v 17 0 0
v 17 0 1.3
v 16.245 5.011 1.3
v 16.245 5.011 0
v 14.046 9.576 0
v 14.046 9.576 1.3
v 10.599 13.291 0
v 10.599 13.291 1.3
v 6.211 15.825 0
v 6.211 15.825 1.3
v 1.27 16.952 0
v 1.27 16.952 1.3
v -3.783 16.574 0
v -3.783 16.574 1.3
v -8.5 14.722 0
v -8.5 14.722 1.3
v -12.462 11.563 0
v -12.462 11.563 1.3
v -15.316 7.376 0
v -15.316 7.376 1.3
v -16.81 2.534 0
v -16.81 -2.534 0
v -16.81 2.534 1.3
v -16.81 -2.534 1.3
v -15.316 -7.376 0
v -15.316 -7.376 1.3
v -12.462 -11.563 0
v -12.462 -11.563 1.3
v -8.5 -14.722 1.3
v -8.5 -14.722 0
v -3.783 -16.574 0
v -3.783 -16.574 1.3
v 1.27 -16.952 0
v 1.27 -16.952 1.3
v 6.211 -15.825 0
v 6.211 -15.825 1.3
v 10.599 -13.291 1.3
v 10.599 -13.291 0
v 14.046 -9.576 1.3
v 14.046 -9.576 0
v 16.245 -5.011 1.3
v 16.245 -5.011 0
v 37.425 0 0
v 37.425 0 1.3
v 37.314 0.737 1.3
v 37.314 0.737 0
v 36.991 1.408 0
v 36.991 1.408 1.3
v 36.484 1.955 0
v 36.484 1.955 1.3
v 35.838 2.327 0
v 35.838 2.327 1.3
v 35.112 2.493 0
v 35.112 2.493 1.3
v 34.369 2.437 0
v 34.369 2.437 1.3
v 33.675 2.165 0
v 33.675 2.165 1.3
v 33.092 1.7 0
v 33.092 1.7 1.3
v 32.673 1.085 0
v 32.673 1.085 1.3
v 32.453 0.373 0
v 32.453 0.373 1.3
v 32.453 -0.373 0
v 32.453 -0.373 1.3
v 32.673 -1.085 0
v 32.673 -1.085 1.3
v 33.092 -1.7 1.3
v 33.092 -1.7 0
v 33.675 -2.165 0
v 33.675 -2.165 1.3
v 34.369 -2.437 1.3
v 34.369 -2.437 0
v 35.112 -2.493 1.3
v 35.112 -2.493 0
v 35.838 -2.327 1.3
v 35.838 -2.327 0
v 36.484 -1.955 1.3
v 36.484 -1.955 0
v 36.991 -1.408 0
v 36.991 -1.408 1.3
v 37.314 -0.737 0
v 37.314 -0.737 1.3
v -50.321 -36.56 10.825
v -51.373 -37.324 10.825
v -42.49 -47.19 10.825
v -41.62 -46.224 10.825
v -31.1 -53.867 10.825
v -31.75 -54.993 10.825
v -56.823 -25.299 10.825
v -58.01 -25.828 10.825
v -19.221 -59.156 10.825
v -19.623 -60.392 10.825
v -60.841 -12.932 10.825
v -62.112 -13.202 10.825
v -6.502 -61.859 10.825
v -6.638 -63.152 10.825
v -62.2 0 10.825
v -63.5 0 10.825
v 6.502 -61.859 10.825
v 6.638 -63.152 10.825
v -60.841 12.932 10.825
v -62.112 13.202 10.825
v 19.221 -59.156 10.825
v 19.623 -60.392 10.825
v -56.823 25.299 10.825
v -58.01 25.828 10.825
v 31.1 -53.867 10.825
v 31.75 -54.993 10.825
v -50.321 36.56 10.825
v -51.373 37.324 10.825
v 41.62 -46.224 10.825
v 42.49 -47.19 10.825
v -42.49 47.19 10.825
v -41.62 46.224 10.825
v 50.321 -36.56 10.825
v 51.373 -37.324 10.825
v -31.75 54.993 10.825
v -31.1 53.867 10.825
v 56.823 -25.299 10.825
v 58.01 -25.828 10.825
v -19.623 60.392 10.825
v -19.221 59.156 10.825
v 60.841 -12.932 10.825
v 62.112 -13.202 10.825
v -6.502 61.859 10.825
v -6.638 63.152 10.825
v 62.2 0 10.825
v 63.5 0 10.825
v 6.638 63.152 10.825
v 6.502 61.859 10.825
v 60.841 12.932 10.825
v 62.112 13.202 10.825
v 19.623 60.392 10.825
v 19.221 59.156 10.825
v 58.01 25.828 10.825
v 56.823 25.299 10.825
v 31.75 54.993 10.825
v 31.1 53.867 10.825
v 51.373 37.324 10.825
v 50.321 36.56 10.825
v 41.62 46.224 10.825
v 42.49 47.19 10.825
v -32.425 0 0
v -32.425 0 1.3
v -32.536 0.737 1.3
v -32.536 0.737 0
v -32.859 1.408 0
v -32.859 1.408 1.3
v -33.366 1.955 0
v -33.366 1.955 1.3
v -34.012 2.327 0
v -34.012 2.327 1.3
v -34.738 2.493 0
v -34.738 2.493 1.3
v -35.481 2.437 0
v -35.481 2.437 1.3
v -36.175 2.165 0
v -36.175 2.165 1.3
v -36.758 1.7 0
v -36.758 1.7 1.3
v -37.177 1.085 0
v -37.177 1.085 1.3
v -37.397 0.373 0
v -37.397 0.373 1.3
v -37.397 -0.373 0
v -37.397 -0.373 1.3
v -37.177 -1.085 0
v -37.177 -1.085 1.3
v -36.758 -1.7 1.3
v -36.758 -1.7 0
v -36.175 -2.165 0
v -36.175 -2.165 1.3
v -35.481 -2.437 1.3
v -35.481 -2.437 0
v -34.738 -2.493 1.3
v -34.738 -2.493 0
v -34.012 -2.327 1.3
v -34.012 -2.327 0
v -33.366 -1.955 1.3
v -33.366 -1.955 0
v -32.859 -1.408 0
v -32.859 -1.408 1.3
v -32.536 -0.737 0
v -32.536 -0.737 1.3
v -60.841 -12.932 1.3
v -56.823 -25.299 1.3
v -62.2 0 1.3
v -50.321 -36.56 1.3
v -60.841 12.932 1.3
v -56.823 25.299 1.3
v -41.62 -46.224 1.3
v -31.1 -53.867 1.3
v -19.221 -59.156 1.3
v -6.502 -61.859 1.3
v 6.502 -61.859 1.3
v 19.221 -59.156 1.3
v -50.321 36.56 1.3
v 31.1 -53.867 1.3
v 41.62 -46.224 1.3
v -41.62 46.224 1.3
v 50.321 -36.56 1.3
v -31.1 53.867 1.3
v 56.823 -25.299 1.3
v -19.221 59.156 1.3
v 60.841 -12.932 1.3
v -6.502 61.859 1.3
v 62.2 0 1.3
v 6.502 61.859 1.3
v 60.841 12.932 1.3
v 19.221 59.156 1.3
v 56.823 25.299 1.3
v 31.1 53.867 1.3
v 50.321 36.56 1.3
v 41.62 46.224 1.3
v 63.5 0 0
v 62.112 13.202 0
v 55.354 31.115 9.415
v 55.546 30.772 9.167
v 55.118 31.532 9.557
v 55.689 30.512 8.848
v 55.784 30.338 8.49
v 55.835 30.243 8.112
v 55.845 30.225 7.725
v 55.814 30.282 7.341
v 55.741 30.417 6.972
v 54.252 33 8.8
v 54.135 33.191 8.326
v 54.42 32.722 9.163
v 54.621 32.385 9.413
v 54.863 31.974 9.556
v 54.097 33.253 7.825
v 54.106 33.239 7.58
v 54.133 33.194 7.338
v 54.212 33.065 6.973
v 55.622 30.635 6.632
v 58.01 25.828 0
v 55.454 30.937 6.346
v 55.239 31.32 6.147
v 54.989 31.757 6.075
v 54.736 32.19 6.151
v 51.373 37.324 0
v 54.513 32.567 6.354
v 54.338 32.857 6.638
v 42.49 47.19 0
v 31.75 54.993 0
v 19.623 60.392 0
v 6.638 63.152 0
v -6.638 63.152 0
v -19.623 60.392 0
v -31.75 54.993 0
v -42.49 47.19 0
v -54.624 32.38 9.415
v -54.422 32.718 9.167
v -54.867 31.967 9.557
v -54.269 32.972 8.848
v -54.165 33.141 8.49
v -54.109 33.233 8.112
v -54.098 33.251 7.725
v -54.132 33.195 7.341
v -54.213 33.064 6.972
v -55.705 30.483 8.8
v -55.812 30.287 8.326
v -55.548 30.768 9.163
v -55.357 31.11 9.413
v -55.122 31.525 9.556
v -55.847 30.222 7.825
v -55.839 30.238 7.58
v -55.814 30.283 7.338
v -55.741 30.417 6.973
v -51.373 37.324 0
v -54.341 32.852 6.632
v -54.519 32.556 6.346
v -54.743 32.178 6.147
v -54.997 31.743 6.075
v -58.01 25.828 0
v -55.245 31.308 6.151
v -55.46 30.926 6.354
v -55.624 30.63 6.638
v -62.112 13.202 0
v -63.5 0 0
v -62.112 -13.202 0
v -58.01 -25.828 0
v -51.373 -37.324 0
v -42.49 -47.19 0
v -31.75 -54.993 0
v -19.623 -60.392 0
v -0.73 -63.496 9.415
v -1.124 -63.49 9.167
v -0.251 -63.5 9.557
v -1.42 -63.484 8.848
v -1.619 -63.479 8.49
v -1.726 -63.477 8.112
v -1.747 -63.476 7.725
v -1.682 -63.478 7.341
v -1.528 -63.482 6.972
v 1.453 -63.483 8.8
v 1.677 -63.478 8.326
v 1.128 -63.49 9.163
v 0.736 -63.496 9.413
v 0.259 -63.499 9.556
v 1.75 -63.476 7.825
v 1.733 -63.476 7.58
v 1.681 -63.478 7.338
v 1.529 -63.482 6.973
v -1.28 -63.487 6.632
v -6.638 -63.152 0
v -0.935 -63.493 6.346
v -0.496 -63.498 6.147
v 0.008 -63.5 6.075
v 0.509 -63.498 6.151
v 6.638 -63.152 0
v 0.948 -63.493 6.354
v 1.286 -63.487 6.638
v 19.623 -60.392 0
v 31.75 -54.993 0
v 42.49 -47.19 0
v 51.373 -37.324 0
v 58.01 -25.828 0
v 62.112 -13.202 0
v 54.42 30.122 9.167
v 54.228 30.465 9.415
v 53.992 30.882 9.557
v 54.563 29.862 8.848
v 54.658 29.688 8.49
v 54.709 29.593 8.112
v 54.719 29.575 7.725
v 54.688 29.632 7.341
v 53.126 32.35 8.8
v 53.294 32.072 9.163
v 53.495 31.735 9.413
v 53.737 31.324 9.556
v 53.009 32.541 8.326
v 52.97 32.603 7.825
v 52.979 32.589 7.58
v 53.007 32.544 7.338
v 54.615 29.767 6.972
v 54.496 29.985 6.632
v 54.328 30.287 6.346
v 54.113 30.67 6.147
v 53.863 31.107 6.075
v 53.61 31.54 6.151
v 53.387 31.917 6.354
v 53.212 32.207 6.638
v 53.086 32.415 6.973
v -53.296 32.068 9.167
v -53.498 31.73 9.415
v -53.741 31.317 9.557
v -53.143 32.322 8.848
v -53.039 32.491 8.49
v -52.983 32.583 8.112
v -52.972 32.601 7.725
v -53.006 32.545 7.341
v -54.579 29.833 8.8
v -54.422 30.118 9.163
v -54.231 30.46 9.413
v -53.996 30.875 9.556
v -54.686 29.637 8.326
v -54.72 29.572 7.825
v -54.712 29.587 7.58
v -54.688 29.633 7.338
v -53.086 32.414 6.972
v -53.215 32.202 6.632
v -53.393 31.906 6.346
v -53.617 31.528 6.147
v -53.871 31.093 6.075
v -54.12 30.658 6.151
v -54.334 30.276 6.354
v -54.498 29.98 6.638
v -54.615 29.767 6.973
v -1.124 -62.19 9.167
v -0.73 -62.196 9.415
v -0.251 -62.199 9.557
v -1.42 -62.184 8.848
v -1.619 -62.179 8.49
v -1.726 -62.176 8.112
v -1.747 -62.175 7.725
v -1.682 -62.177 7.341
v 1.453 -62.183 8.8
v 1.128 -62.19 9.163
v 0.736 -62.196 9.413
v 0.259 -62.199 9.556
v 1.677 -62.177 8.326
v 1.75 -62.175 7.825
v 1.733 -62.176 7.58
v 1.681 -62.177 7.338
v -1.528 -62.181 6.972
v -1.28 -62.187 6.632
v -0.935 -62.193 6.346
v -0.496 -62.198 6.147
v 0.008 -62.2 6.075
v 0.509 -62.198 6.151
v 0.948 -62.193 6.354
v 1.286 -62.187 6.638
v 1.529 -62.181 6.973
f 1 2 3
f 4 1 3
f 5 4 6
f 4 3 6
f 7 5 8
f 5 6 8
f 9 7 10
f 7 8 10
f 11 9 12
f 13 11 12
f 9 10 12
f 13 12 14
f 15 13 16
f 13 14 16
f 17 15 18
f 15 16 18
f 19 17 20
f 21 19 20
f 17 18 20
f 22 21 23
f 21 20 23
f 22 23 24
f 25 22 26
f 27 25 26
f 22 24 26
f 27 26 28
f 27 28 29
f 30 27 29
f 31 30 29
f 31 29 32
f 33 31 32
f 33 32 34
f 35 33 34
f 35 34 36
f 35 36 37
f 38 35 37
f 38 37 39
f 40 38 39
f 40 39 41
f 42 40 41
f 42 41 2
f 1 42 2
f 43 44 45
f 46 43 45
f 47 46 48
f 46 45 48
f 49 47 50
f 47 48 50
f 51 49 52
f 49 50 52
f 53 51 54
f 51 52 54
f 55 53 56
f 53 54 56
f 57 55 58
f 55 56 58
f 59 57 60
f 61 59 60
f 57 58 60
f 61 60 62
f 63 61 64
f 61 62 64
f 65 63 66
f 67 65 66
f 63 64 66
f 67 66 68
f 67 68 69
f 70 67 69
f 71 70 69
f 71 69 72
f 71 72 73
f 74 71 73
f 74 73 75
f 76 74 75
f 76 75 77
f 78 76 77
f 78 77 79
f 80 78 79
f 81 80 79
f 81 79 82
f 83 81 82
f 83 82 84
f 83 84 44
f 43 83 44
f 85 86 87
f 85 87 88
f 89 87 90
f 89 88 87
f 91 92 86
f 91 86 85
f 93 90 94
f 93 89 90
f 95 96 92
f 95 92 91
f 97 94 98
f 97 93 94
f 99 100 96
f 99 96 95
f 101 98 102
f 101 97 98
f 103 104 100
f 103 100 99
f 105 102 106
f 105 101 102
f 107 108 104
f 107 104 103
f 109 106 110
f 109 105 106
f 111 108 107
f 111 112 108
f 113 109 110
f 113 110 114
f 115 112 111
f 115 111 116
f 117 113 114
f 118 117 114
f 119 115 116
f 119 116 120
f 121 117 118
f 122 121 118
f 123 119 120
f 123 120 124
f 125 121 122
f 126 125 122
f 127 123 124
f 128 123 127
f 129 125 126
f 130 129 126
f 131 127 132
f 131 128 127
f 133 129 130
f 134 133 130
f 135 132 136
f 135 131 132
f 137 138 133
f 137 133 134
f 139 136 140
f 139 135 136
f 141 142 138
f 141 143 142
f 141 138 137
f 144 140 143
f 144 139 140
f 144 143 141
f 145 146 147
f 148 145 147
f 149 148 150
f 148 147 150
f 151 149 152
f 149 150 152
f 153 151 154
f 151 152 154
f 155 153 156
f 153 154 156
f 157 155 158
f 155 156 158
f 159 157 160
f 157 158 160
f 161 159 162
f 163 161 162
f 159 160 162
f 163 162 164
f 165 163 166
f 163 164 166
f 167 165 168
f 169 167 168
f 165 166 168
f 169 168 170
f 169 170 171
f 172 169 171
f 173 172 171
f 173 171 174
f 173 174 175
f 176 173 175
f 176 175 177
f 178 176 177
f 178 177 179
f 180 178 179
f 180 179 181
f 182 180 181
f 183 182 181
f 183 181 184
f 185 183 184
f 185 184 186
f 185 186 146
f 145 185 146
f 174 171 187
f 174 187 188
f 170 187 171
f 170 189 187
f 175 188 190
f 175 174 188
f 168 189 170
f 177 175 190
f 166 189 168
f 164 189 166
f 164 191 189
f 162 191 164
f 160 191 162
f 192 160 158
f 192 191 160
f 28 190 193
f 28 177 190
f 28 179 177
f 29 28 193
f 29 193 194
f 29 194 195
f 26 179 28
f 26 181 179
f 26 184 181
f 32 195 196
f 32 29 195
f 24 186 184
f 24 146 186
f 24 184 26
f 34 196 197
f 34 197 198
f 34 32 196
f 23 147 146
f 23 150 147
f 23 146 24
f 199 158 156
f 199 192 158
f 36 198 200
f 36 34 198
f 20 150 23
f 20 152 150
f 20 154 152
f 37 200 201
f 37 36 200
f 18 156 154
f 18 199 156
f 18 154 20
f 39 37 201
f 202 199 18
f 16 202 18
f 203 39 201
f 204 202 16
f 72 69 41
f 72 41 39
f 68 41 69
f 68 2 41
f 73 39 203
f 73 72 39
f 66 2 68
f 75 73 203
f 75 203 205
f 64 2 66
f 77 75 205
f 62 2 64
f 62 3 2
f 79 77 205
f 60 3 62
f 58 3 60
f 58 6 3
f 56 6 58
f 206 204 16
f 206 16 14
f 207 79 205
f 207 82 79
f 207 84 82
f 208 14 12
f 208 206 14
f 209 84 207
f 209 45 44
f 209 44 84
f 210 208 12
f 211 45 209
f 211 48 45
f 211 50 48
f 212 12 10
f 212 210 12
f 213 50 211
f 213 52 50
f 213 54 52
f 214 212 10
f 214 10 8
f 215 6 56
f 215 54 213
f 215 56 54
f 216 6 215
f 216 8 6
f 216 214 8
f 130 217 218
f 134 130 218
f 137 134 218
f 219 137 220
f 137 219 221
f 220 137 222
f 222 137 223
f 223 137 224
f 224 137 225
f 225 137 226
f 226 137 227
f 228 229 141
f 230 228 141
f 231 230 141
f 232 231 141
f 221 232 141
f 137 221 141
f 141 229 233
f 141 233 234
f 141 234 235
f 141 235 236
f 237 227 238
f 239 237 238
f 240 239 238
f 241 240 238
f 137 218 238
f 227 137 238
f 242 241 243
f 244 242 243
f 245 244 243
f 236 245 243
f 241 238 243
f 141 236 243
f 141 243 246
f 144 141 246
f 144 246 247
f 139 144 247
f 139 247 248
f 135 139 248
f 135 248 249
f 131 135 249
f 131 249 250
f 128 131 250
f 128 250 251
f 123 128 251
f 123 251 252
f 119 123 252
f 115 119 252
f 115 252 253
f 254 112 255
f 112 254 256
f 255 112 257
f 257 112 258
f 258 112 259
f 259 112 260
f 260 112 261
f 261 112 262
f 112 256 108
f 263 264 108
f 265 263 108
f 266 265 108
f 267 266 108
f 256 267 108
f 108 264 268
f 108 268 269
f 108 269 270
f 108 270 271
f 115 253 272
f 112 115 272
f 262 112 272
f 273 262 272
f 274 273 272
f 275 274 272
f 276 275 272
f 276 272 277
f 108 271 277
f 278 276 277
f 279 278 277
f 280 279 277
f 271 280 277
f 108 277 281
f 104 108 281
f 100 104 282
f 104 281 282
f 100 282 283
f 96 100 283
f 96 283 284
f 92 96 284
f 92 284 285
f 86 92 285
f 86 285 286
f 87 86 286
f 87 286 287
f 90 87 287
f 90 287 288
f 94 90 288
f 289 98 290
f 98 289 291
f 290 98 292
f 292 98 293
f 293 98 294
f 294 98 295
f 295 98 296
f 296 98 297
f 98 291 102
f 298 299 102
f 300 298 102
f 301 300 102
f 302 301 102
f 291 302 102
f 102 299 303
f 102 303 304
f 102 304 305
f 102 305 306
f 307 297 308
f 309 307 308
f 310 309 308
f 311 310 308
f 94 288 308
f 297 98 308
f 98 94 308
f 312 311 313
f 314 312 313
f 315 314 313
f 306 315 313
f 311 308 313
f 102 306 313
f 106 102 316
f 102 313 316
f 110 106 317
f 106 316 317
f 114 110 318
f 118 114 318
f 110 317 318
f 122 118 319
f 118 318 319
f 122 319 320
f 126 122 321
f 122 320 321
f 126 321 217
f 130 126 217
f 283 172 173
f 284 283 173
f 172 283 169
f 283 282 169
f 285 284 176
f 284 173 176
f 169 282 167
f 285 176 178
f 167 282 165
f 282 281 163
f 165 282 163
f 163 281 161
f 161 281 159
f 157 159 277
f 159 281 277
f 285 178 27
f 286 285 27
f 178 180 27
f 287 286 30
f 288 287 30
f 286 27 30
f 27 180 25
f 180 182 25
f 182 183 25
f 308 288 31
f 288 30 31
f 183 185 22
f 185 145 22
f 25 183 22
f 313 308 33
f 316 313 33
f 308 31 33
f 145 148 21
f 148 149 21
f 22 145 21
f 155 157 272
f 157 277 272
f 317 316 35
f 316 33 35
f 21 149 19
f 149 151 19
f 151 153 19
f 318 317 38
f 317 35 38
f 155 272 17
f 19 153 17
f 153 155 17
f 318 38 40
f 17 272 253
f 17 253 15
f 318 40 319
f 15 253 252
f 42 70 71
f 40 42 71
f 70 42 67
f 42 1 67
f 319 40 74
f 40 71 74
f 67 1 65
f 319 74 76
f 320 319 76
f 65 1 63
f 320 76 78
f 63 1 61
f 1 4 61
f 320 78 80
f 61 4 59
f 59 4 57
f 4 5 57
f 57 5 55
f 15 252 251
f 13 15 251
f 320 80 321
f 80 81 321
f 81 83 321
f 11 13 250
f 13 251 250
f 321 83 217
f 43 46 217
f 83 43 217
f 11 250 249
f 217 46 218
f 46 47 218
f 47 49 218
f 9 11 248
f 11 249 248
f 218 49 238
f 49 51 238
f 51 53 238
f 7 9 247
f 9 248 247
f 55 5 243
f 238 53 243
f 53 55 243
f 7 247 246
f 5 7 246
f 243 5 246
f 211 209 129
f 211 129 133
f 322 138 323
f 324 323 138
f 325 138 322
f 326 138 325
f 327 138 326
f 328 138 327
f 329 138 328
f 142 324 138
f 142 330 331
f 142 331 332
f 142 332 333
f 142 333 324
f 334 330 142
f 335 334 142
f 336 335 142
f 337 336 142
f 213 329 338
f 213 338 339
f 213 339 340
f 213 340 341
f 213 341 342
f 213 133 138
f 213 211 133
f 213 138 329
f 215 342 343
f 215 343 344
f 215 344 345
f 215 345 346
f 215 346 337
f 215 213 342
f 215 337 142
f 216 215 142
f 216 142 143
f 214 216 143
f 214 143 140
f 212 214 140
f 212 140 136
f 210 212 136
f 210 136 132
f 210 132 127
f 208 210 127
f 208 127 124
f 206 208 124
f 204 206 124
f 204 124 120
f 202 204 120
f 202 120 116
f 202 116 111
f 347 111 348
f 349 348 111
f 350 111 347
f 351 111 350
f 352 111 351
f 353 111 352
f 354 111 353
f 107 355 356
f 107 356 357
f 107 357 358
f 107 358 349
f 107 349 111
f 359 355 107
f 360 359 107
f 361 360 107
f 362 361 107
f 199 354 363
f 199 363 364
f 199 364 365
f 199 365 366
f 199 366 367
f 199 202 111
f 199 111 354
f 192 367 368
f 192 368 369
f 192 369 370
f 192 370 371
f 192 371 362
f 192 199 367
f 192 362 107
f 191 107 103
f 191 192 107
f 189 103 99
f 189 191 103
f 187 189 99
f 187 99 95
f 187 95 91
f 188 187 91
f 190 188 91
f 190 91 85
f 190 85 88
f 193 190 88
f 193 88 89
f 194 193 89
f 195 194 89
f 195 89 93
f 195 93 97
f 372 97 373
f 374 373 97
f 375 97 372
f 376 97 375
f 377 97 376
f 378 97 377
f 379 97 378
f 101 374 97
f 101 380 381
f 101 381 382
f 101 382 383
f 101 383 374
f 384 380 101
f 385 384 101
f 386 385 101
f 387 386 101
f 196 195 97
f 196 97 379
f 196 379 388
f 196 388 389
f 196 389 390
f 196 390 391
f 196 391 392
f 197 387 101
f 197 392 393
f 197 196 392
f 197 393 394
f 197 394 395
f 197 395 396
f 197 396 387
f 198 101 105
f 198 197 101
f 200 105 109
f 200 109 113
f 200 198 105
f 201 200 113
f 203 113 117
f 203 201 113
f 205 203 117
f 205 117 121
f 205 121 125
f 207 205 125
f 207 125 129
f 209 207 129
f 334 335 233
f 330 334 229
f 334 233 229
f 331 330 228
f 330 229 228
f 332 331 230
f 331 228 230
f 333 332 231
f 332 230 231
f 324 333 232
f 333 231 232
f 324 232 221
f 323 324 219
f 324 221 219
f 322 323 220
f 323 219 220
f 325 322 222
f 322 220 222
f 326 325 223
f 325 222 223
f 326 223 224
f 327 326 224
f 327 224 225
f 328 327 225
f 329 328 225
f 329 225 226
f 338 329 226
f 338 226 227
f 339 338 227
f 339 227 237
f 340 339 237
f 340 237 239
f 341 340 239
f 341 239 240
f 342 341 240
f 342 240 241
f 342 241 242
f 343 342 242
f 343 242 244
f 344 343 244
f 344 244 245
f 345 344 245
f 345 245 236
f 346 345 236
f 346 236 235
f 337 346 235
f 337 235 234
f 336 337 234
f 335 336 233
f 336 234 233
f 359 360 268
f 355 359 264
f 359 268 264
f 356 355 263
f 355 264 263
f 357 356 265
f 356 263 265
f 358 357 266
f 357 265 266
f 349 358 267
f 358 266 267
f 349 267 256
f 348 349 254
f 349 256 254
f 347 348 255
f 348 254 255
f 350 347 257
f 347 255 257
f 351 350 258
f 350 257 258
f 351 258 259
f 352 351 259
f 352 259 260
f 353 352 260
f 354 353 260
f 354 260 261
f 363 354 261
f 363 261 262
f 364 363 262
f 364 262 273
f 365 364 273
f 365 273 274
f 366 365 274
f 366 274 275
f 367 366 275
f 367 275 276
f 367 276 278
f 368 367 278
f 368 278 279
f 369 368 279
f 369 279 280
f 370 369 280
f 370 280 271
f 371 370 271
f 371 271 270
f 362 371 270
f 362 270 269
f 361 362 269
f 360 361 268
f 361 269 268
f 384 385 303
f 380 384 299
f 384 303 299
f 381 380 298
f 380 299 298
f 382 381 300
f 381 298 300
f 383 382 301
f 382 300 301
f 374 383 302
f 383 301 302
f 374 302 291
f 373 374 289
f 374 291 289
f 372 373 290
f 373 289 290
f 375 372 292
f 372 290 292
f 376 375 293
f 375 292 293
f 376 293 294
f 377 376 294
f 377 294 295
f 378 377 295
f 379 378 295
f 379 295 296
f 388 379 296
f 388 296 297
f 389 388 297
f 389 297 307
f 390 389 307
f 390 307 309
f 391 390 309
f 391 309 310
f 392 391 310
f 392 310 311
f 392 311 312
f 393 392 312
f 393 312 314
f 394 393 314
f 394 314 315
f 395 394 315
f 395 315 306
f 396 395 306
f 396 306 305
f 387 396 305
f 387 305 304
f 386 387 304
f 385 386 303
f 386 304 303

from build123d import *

# Parameters (mm, degrees)
F0_R      = 63.5
F1_DEPTH  = 1.3
F2_R      = 2.5
F3_DEPTH  = 25
F4_R      = 63.5
F4_R_2    = 62.2
F5_DEPTH  = 9.525
F7_R      = 1.75
F8_DEPTH  = 5
F9_COUNT  = 3
F11_R     = 17
F12_DEPTH = 25


with BuildPart() as f1:
    # F0 (on Top) → F1 (new body)
    with BuildSketch(Plane.XY):
        Circle(F0_R)
    extrude(amount=F1_DEPTH)

    # F2 (on face) → F3 (cut)
    with BuildSketch(Plane.XY.offset(1.3)):
        with Locations((-34.925, 0)):
            Circle(F2_R)
        with Locations((34.925, 0)):
            Circle(F2_R)
    extrude(amount=-F3_DEPTH, mode=Mode.SUBTRACT)

    # F4 (on face) → F5 (join)
    with BuildSketch(Plane.XY.offset(1.3)):
        Circle(F4_R)
        Circle(F4_R_2, mode=Mode.SUBTRACT)
    extrude(amount=F5_DEPTH)


with BuildPart() as f8:
    # F7 (on offset) → F8 (new body)
    with BuildSketch(Plane.XZ.offset(63.9)):
        with Locations((0, 7.825)):
            Circle(F7_R)
    extrude(amount=-F8_DEPTH)


with BuildPart() as f9_1:
    # F9: instance of F8
    add(f8.part.rotate(Axis((0, 0, 0), (0, 0, -1)), 1 * 360 / F9_COUNT))


with BuildPart() as f9_2:
    # F9: instance of F8
    add(f8.part.rotate(Axis((0, 0, 0), (0, 0, -1)), 2 * 360 / F9_COUNT))


with BuildPart() as f1_1:
    add(f1.part)

    # F10: cut F8, F9_2, F9_1
    add(f8.part, mode=Mode.SUBTRACT)
    add(f9_2.part, mode=Mode.SUBTRACT)
    add(f9_1.part, mode=Mode.SUBTRACT)

    # F11 (on face) → F12 (cut)
    with BuildSketch(Plane.XY.offset(1.3)):
        Circle(F11_R)
    extrude(amount=-F12_DEPTH, mode=Mode.SUBTRACT)


solid = f1_1.part
